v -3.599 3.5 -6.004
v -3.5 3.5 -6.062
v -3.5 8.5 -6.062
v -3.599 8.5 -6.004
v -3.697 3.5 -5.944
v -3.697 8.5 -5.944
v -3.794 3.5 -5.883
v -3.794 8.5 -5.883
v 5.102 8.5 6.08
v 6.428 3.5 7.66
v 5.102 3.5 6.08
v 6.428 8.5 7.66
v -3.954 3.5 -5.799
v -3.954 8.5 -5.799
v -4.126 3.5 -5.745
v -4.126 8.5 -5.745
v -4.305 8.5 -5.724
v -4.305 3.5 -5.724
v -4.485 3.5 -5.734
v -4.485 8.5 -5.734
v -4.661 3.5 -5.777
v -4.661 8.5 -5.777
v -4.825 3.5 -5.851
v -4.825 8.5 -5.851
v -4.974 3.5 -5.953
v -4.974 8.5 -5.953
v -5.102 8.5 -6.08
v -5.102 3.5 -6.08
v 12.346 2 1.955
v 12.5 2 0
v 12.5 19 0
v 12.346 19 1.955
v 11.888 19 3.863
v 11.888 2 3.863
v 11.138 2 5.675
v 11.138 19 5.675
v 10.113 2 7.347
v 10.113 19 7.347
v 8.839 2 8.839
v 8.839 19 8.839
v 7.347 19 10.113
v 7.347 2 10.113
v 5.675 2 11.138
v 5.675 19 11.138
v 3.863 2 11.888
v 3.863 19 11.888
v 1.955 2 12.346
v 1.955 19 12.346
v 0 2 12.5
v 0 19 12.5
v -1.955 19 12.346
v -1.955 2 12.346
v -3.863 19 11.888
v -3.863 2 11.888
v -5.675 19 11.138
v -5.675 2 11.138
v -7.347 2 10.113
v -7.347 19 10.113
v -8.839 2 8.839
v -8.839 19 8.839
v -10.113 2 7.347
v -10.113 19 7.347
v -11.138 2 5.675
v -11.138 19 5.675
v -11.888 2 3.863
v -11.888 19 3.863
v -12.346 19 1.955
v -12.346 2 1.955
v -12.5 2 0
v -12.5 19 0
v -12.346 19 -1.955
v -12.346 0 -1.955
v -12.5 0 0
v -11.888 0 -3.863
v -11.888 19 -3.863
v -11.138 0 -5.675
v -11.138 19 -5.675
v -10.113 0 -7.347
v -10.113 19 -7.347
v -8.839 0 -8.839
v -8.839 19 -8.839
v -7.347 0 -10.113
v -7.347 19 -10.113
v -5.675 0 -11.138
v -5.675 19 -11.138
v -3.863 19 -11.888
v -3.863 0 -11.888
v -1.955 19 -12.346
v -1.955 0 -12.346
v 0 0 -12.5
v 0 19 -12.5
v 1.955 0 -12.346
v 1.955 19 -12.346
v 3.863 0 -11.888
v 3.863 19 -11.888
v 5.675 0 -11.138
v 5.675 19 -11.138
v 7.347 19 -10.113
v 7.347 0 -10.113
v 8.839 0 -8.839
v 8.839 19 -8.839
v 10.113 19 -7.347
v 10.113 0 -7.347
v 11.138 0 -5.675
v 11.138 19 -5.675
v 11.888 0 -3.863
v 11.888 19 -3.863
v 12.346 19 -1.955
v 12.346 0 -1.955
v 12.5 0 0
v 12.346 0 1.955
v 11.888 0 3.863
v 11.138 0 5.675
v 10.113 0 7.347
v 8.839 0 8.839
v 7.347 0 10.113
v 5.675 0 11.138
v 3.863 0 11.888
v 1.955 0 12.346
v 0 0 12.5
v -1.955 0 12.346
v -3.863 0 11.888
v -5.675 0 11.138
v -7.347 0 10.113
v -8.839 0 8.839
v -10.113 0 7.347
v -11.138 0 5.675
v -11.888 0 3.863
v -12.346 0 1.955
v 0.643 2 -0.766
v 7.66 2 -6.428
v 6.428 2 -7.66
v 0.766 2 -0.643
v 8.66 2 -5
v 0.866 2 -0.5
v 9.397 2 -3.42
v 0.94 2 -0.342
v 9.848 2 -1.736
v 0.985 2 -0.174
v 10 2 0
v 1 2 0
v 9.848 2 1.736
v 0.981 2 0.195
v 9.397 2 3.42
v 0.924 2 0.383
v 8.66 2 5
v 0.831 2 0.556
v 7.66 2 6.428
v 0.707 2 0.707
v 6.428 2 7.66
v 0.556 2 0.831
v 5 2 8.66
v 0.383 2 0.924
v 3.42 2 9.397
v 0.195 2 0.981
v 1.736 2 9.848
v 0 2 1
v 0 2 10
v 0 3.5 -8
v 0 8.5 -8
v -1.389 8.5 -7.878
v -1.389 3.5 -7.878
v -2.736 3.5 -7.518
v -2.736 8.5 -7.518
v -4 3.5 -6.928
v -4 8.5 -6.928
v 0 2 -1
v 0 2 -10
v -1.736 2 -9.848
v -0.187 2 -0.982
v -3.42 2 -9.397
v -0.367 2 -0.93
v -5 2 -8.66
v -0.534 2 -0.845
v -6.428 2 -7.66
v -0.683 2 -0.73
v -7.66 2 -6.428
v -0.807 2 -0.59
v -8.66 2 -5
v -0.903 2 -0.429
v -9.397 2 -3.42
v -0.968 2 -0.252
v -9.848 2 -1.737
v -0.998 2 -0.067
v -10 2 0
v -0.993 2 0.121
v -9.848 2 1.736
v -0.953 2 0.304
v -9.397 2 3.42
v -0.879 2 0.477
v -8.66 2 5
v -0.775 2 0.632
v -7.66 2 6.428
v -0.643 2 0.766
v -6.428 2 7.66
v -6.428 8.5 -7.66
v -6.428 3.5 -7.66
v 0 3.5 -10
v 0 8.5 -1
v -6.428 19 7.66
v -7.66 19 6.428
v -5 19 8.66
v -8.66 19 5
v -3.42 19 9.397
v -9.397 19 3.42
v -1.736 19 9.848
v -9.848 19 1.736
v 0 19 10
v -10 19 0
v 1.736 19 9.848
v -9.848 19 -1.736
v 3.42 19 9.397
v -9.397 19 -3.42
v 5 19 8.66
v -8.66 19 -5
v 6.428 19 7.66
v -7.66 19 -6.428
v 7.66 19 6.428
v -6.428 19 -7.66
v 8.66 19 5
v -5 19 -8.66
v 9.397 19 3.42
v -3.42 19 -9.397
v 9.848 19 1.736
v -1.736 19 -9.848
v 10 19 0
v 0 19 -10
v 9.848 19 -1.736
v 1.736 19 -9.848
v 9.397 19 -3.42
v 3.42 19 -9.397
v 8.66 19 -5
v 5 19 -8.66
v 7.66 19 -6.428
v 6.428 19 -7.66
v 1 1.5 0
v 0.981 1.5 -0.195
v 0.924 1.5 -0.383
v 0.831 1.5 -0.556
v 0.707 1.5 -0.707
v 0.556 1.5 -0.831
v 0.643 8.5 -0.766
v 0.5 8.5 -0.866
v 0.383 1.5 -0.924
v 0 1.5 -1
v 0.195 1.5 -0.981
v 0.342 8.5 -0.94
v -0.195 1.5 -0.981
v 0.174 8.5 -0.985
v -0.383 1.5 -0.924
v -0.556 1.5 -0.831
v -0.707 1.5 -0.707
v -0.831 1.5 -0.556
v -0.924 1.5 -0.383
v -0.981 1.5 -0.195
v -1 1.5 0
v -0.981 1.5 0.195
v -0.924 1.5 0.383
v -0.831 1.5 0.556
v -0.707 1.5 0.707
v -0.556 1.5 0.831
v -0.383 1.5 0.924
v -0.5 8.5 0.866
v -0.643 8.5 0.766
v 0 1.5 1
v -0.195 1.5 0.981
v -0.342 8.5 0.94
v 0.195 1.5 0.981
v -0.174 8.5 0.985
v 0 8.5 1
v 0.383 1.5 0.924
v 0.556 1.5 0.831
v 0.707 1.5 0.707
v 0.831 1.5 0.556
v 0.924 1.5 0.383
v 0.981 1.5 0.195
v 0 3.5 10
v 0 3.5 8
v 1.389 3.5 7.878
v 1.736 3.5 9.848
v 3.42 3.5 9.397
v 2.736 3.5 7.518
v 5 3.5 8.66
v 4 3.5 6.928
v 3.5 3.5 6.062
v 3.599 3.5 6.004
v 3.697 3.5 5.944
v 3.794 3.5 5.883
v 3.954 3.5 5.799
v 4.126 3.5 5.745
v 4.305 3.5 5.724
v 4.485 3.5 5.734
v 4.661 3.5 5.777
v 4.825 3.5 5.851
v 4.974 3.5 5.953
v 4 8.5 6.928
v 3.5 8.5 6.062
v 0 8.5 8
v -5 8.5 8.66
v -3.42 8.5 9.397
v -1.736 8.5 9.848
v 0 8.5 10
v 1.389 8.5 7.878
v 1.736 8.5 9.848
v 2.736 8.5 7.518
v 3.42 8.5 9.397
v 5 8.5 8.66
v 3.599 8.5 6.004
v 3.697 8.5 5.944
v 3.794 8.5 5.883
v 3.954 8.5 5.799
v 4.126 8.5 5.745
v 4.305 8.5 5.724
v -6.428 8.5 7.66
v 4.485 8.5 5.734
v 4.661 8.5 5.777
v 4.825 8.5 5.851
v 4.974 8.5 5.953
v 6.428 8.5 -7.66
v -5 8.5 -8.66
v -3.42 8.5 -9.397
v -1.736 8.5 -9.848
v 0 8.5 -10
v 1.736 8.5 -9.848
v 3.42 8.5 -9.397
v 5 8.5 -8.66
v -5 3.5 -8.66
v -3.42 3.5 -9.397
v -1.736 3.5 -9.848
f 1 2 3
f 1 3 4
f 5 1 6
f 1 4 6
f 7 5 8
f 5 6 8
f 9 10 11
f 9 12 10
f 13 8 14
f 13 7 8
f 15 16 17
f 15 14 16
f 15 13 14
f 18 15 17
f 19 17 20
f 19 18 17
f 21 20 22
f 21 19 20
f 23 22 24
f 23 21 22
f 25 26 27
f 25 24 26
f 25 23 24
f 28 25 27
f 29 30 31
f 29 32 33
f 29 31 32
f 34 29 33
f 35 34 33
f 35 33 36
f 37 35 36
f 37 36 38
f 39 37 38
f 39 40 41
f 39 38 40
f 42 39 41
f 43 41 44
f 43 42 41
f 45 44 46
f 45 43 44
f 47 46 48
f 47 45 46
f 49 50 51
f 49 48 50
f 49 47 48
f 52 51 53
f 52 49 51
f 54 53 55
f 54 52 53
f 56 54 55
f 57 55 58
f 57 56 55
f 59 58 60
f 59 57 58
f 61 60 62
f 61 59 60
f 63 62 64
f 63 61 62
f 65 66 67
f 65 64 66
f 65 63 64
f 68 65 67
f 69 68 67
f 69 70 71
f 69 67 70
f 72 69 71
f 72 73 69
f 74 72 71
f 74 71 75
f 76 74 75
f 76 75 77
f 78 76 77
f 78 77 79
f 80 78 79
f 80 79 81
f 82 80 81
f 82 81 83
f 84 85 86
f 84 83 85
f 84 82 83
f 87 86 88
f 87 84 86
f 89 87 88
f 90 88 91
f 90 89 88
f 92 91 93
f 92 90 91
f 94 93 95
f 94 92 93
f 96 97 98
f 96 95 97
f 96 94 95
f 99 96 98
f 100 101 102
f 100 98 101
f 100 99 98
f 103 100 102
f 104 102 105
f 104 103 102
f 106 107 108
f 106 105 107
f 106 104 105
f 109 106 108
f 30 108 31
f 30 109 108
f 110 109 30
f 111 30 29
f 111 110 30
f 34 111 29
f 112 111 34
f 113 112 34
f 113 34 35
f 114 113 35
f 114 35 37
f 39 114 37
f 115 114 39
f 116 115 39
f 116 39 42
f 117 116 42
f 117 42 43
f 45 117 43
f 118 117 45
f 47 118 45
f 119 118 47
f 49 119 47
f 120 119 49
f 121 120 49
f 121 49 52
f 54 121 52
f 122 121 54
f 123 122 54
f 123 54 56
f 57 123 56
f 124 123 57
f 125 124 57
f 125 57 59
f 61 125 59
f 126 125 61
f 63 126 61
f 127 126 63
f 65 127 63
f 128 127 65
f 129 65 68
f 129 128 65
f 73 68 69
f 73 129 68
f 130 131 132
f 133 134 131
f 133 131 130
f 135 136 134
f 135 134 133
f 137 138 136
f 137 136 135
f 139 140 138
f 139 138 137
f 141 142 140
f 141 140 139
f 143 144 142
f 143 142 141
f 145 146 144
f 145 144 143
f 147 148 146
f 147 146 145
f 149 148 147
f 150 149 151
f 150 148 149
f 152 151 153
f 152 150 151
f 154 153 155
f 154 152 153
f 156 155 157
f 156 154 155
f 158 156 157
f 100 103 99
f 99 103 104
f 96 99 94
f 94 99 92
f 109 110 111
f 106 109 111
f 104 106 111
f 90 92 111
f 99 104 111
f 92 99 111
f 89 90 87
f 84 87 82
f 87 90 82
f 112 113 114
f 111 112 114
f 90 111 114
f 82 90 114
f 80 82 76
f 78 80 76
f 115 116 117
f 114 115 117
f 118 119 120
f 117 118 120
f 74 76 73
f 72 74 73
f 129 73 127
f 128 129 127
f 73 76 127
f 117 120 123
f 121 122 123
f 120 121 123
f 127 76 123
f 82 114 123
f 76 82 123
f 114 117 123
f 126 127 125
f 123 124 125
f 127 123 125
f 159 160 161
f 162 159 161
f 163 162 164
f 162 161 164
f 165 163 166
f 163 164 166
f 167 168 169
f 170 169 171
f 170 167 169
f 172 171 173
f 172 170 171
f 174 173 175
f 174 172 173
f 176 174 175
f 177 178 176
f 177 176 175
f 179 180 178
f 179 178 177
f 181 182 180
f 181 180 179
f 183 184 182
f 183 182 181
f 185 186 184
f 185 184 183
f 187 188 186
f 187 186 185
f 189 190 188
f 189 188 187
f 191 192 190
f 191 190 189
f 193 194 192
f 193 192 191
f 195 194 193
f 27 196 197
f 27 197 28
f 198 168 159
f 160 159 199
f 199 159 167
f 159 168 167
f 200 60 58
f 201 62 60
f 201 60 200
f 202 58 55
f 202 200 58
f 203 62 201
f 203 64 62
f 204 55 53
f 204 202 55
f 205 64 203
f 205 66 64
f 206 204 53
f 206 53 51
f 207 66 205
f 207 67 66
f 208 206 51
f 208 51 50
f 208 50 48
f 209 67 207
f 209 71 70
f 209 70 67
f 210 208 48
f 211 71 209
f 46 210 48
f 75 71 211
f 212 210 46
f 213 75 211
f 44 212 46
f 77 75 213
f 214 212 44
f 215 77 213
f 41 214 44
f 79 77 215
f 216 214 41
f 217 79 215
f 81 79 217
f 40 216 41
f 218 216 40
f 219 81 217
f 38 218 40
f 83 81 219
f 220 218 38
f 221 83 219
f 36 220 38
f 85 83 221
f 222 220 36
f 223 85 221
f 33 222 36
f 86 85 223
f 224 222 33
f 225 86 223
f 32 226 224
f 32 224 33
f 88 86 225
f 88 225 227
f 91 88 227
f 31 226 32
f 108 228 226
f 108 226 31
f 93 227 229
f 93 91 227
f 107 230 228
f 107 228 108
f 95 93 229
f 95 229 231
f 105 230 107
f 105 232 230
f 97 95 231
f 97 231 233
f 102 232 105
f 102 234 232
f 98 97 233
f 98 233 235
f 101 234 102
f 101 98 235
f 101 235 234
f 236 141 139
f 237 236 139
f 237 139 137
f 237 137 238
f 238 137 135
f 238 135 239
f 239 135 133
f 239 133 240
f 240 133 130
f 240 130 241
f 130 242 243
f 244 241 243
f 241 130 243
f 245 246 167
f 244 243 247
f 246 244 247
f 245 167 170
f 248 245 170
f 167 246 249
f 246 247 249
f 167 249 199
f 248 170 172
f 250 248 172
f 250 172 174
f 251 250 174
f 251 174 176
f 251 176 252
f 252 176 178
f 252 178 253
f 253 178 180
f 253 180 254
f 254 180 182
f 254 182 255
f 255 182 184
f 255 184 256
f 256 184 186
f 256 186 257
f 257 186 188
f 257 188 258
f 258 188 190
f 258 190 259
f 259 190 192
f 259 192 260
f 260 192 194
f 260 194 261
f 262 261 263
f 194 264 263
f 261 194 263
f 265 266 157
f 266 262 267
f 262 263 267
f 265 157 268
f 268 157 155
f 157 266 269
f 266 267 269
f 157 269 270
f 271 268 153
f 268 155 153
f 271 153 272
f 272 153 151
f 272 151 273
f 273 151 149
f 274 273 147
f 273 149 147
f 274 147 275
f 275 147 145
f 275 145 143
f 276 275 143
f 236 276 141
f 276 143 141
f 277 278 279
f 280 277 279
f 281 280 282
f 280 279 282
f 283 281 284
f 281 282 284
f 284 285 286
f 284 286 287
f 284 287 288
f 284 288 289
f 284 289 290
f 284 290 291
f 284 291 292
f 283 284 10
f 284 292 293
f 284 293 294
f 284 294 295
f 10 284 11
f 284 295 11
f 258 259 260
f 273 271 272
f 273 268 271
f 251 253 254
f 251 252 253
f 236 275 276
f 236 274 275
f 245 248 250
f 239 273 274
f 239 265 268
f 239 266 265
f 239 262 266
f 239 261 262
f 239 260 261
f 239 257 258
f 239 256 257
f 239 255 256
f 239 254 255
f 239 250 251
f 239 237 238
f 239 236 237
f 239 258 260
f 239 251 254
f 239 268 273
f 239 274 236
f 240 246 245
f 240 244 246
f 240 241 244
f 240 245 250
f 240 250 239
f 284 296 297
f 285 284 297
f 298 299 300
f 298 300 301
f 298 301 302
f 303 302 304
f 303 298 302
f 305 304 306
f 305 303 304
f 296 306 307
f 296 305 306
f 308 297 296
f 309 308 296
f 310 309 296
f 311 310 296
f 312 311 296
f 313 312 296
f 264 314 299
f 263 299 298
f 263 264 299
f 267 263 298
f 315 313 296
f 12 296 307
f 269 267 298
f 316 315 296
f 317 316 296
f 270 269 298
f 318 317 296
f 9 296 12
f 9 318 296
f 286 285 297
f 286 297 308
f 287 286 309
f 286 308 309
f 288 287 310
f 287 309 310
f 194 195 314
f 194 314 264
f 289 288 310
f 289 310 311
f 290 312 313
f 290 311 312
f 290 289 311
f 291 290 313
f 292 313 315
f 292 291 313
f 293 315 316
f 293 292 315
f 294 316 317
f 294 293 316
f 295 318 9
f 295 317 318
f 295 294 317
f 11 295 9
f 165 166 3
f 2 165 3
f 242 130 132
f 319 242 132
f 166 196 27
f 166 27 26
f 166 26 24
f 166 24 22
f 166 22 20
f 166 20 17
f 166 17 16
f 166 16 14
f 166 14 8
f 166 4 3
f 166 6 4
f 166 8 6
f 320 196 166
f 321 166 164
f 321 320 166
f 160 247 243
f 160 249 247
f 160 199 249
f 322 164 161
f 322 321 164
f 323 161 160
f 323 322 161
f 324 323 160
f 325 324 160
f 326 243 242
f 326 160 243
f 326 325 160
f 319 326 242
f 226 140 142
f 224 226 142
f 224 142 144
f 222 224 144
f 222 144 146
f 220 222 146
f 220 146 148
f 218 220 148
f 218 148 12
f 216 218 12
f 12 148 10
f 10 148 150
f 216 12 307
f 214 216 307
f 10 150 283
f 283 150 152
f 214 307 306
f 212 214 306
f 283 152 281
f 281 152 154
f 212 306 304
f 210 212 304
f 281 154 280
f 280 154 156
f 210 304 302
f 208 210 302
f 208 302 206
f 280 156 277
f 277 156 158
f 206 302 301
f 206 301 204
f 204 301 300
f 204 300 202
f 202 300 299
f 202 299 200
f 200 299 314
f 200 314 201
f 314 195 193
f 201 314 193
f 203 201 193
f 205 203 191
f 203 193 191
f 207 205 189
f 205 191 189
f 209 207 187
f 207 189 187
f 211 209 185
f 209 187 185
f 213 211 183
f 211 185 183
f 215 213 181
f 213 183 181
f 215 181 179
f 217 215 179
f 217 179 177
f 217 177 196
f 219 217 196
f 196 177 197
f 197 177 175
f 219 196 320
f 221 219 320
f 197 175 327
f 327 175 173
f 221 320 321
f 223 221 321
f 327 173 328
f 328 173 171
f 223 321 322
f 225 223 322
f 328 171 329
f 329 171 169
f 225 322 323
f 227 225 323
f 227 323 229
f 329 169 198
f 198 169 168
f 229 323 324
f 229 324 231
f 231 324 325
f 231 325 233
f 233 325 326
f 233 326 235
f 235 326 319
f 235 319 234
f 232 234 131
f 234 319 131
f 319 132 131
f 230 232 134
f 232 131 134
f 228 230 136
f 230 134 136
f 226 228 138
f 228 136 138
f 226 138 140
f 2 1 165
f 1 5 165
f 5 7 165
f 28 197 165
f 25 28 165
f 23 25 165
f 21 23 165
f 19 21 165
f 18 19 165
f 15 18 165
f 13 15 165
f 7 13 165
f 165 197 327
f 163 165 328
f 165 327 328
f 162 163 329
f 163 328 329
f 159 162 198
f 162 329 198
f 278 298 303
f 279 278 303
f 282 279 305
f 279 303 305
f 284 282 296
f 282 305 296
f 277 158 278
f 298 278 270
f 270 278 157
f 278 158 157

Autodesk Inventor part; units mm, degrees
ref_plane "YZ Plane" through (0, 0, 0) normal (1, 0, 0) x (0, 1, 0)
ref_plane "XZ Plane" through (0, 0, 0) normal (0, 1, 0) x (-1, 0, 0)
ref_plane "XY Plane" through (0, 0, 0) normal (0, 0, 1) x (1, 0, 0)
sketch "スケッチ1" plane through (0, 0, 0) normal (0, 1, 0) x (-1, 0, 0)
  circle A0 centre (0, 0) radius 12.5
  dimension "d0" = 25
extrude "押し出し1" add sketch "スケッチ1" along normal blind 2
sketch "スケッチ2" plane through (0, 2, 0) normal (0, 1, 0) x (1, 0, 0)
  circle A0 centre (0, 0) radius 12.5
  circle A1 centre (0, 0) radius 10
  dimension "d3" = 25
  dimension "d4" = 20
extrude "押し出し2" add sketch "スケッチ2" along normal blind 17
sketch "スケッチ3" plane through (0, 2, 0) normal (0, 1, 0) x (1, 0, 0)
  arc A0 (-6.4279, -7.6604) -> (0, -10) centre (0, 0) ccw
  line L0 (0, 0) -> (-6.4279, -7.6604) construction
  line L1 (0, 0) -> (0, -10) construction
  arc A1 (6.4279, 7.6604) -> (0, 10) centre (0, 0) ccw
  line L2 (0, 0) -> (6.4279, 7.6604) construction
  line L3 (0, 0) -> (0, 10) construction
  circle A2 centre (0, 0) radius 10 projected
  line L4 (-6.4279, -7.6604) -> (0, 0)
  line L5 (0, 0) -> (6.4279, 7.6604)
  line L6 (0, -10) -> (0, 0)
  line L7 (0, 10) -> (0, 0)
  circle A3 centre (0, 0) radius 10 projected
  point P0 (3.2139, 3.8302)
  dimension "d8" = 40
  dimension "d10" = 40
  dimension "d11" = 3.8302
  dimension "d12" = 6.4279
extrude "押し出し3" add sketch "スケッチ3" along normal blind 6.5 contours L4 L6 A0 | A1 L5 L7
sketch "スケッチ4" plane through (0, 8.5, 0) normal (0, 1, 0) x (1, 0, 0)
  line L0 (0, -10) -> (0, 0) projected
  circle A0 centre (0, 0) radius 1
  dimension "d15" = 2
extrude "押し出し4" cut sketch "スケッチ4" against normal blind 7
ref_plane "作業平面1" through (0, 9, 0) normal (0, 1, 0) x (1, 0, 0)
sketch "スケッチ5" plane through (0, 8.5, 0) normal (0, 1, 0) x (1, 0, 0)
  line L0 (0, -10) -> (0, -1) projected
  arc A0 (0, -10) -> (6.4279, -7.6604) centre (0, 0) ccw
  line L1 (0, 0) -> (6.4279, -7.6604) construction
  line L2 (0, 0) -> (0, -10) construction
  arc A1 (0, -8) -> (4, -6.9282) centre (0, 0) ccw
  line L3 (0, 0) -> (4, -6.9282) construction
  line L4 (0, 0) -> (0, -8) construction
  arc A2 (3.5, -6.0622) -> (4.4995, -5.3623) centre (0, 0) ccw
  line L5 (0, 0) -> (4.4995, -5.3623) construction
  line L6 (0, 0) -> (3.5, -6.0622) construction
  arc A3 (0, -10) -> (6.4279, 7.6604) centre (0, 0) ccw projected
  line L7 (0, -10) -> (0, -8)
  line L8 (6.4279, -7.6604) -> (4.4995, -5.3623)
  line L9 (4, -6.9282) -> (3.5, -6.0622)
  line L10 (0, 1) -> (0, 10) projected
  arc A4 (0, 10) -> (-6.4279, 7.6604) centre (0, 0) ccw
  line L11 (0, 0) -> (-6.4279, 7.6604) construction
  line L12 (0, 0) -> (0, 10) construction
  arc A5 (0, 8) -> (-4, 6.9282) centre (0, 0) ccw
  line L13 (0, 0) -> (-4, 6.9282) construction
  line L14 (0, 0) -> (0, 8) construction
  arc A6 (-3.5, 6.0622) -> (-4.4995, 5.3623) centre (0, 0) ccw
  line L15 (0, 0) -> (-3.5, 6.0622) construction
  line L16 (0, 0) -> (-4.4995, 5.3623) construction
  line L17 (-6.4279, 7.6604) -> (-4.4995, 5.3623)
  line L18 (-4, 6.9282) -> (-3.5, 6.0622)
  line L19 (0, 10) -> (0, 8)
  dimension "d19" = 10
  dimension "d20" = 40
  dimension "d21" = 8
  dimension "d22" = 30
  dimension "d23" = 7
  dimension "d24" = 10
  dimension "d25" = 10
  dimension "d26" = 40
  dimension "d27" = 8
  dimension "d28" = 30
  dimension "d29" = 7
  dimension "d30" = 10
extrude "押し出し5" add sketch "スケッチ5" against normal blind 5
fillet "フィレット1" radius 1 1 edges at (-4.4995, 6, -5.3623)
fillet "フィレット2" radius 1 1 edges at (4.4995, 6, 5.3623)
properties part number "kumi2"
